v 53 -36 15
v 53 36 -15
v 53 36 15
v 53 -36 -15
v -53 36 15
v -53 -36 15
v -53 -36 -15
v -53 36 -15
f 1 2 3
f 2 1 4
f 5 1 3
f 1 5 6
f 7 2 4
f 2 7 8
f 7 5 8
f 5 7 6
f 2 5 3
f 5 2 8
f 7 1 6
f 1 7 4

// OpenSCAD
// --- Dimensions ---
BLOCK_L = 106;       // Block length (X)
BLOCK_W = 72;        // Block width (Y)
BLOCK_H = 30;        // Block height (Z)

HOLE_DIA = 11.2;     // Hole diameter
HOLE_DEPTH = 25;   // Hole depth (open at top, 5mm floor remains)

ROWS = 4;            // Number of rows along Y
COLS = 6;            // Number of columns along X
SPACING_X = 16;      // Hole spacing along X (centre-to-centre)
SPACING_Y = 16;     // Hole spacing along Y (centre-to-centre)

$fn = 64;

// --- Hole grid origin (bottom-left of grid) ---
grid_x0 = -(COLS - 1) * SPACING_X / 2;
grid_y0 = -(ROWS - 1) * SPACING_Y / 2;

// --- Main block ---
difference() {
    // Solid rectangular block
    cube([BLOCK_L, BLOCK_W, BLOCK_H], center = true);

    // Drill holes
    for (i = [0 : COLS - 1]) {
        for (j = [0 : ROWS - 1]) {
            hx = grid_x0 + i * SPACING_X;
            hy = grid_y0 + j * SPACING_Y;

            // Hole extends past the bottom of the block to ensure clean cut
            translate([hx, hy, BLOCK_H / 2 + 0.01]) {
                cylinder(h = HOLE_DEPTH + BLOCK_H / 2 + 0.01, d = HOLE_DIA, center = false);
            }
        }
    }
}
